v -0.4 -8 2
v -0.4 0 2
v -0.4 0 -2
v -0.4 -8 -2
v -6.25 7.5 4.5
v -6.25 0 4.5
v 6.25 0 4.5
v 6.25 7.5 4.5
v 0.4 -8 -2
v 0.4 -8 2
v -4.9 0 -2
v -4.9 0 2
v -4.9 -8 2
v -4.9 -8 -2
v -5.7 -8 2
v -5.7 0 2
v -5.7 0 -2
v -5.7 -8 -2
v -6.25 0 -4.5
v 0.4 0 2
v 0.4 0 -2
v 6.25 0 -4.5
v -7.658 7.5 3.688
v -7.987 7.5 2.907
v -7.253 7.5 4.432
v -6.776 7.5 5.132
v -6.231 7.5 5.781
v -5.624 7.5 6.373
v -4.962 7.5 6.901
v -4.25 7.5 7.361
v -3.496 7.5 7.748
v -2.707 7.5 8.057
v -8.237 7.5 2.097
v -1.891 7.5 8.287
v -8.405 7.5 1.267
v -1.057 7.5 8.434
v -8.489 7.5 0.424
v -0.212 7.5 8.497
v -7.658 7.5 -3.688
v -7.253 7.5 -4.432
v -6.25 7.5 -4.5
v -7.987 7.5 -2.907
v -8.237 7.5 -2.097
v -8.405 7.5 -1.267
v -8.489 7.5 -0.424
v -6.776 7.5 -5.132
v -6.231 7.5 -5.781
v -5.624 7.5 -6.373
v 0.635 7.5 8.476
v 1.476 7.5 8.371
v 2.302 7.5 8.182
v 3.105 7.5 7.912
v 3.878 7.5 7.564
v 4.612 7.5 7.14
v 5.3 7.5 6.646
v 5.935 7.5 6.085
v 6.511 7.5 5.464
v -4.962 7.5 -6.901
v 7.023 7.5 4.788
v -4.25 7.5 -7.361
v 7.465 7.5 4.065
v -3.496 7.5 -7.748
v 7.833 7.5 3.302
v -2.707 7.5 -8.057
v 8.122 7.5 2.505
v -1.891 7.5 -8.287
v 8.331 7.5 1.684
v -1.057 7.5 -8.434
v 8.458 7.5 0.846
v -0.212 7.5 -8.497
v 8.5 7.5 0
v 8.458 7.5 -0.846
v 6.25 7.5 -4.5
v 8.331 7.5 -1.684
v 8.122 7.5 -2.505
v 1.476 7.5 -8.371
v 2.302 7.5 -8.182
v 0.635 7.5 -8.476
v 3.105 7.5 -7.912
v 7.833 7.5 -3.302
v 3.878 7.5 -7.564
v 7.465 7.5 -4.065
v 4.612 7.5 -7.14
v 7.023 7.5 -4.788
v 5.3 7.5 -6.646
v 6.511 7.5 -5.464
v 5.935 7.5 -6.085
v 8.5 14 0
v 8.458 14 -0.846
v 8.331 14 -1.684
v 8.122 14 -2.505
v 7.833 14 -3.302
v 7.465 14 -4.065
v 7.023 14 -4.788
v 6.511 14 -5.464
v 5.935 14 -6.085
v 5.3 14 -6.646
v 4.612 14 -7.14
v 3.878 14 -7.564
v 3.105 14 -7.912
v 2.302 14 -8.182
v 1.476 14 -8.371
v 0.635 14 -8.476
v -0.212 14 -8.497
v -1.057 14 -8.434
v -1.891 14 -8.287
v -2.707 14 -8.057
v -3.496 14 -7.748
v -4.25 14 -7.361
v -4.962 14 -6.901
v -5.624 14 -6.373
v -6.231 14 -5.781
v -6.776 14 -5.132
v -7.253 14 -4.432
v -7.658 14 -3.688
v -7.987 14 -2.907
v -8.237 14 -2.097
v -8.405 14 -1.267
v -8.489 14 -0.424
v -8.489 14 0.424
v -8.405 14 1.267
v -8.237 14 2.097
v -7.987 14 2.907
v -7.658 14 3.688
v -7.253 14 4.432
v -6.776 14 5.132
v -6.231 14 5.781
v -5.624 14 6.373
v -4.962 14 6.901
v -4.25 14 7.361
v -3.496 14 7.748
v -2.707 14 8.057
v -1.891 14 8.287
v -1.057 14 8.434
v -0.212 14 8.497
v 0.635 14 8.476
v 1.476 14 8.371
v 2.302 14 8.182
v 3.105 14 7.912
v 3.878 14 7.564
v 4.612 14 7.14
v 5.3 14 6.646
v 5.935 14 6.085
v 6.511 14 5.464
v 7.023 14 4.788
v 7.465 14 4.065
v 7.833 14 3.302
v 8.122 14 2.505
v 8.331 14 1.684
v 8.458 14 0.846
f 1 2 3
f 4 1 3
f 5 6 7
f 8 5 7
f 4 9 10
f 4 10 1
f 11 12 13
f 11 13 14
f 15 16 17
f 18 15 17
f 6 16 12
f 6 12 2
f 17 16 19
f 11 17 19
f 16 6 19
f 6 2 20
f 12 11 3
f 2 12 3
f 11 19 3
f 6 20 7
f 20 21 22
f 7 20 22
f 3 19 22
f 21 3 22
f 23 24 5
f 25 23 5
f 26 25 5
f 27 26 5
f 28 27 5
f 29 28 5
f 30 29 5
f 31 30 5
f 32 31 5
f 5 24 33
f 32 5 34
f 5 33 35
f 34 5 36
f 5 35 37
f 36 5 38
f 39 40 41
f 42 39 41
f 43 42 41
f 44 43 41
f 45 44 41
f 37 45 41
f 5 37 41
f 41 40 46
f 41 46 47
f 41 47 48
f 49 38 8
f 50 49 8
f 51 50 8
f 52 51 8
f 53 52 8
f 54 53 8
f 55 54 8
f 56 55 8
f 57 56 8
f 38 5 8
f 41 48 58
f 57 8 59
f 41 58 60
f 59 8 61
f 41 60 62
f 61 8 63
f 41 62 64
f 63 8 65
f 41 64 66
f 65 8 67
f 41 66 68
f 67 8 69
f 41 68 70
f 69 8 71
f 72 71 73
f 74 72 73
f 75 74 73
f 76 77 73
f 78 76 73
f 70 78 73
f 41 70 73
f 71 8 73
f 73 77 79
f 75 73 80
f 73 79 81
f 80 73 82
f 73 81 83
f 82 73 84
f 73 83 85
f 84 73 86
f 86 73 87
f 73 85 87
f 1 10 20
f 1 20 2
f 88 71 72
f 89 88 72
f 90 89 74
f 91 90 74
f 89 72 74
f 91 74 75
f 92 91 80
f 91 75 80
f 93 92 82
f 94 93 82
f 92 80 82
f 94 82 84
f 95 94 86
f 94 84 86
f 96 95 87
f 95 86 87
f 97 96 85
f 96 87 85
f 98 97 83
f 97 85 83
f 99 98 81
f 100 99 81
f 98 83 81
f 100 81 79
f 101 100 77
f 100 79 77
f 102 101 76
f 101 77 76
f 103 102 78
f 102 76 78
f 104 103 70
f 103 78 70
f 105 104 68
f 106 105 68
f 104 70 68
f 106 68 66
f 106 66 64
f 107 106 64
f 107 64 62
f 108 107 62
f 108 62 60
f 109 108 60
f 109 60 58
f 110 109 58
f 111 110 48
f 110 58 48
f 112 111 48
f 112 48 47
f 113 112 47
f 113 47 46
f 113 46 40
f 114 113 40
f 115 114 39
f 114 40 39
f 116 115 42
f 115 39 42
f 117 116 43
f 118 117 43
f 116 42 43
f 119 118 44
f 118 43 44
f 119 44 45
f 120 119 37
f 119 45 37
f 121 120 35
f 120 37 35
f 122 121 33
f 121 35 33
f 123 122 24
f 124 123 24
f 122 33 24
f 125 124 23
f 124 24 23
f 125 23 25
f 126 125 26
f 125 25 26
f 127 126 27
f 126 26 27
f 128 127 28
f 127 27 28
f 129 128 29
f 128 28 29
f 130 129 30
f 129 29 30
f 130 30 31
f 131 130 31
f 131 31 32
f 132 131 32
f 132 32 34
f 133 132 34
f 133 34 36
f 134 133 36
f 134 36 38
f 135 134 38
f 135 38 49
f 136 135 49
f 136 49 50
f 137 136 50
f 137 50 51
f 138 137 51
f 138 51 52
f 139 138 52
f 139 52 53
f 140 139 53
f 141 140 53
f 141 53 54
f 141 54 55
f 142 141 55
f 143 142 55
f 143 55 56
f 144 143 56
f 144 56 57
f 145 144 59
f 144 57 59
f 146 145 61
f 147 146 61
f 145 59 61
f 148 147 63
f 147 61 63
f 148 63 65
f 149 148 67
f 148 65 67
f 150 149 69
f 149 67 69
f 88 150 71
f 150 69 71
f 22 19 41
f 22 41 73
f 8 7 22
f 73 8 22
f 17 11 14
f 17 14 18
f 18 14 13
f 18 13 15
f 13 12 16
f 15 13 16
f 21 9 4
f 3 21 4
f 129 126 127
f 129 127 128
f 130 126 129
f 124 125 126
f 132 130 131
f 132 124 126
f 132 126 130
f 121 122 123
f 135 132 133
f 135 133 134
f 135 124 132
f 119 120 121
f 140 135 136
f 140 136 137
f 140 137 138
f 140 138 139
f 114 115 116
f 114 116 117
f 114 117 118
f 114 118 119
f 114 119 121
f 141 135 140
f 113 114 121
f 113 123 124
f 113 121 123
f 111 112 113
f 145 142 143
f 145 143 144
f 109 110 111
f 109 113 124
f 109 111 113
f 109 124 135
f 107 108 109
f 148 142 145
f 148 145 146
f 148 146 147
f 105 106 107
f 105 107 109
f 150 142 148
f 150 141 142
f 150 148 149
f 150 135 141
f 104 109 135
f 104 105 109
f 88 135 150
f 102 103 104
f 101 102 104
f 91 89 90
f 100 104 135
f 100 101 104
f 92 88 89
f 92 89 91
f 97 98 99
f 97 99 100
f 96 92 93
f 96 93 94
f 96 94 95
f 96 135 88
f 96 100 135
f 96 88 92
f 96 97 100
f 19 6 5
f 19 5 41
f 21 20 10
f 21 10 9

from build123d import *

# Parameters (mm, degrees)
SKICA2_W                = 12.5
SKICA2_H                = 9
P_IDAT_VYSUNUT_M1_DEPTH = 7.5
SKICA3_R                = 8.5
P_IDAT_VYSUNUT_M2_DEPTH = 6.5
SKICA4_W                = 0.8
SKICA4_H                = 4
P_IDAT_VYSUNUT_M3_DEPTH = 8


with BuildPart() as part:
    # Skica2 → Přidat vysunutím1 (new body)
    with BuildSketch(Plane(origin=(0, 0, 0), x_dir=(1, 0, 0), z_dir=(0, 1, 0))):
        Rectangle(SKICA2_W, SKICA2_H)
    extrude(amount=P_IDAT_VYSUNUT_M1_DEPTH)

    # Skica3 → Přidat vysunutím2 (add)
    with BuildSketch(Plane(origin=(0, 7.5, 0), x_dir=(1, 0, 0), z_dir=(0, 1, 0))):
        Circle(SKICA3_R)
    extrude(amount=P_IDAT_VYSUNUT_M2_DEPTH)

    # Skica4 → Přidat vysunutím3 (add)
    with BuildSketch(Plane(origin=(0, 0, 0), x_dir=(-1, 0, 0), z_dir=(0, -1, 0))):
        with Locations((5.3, 0)):
            Rectangle(SKICA4_W, SKICA4_H)
        Rectangle(SKICA4_W, SKICA4_H)
    extrude(amount=P_IDAT_VYSUNUT_M3_DEPTH)


solid = part.part
